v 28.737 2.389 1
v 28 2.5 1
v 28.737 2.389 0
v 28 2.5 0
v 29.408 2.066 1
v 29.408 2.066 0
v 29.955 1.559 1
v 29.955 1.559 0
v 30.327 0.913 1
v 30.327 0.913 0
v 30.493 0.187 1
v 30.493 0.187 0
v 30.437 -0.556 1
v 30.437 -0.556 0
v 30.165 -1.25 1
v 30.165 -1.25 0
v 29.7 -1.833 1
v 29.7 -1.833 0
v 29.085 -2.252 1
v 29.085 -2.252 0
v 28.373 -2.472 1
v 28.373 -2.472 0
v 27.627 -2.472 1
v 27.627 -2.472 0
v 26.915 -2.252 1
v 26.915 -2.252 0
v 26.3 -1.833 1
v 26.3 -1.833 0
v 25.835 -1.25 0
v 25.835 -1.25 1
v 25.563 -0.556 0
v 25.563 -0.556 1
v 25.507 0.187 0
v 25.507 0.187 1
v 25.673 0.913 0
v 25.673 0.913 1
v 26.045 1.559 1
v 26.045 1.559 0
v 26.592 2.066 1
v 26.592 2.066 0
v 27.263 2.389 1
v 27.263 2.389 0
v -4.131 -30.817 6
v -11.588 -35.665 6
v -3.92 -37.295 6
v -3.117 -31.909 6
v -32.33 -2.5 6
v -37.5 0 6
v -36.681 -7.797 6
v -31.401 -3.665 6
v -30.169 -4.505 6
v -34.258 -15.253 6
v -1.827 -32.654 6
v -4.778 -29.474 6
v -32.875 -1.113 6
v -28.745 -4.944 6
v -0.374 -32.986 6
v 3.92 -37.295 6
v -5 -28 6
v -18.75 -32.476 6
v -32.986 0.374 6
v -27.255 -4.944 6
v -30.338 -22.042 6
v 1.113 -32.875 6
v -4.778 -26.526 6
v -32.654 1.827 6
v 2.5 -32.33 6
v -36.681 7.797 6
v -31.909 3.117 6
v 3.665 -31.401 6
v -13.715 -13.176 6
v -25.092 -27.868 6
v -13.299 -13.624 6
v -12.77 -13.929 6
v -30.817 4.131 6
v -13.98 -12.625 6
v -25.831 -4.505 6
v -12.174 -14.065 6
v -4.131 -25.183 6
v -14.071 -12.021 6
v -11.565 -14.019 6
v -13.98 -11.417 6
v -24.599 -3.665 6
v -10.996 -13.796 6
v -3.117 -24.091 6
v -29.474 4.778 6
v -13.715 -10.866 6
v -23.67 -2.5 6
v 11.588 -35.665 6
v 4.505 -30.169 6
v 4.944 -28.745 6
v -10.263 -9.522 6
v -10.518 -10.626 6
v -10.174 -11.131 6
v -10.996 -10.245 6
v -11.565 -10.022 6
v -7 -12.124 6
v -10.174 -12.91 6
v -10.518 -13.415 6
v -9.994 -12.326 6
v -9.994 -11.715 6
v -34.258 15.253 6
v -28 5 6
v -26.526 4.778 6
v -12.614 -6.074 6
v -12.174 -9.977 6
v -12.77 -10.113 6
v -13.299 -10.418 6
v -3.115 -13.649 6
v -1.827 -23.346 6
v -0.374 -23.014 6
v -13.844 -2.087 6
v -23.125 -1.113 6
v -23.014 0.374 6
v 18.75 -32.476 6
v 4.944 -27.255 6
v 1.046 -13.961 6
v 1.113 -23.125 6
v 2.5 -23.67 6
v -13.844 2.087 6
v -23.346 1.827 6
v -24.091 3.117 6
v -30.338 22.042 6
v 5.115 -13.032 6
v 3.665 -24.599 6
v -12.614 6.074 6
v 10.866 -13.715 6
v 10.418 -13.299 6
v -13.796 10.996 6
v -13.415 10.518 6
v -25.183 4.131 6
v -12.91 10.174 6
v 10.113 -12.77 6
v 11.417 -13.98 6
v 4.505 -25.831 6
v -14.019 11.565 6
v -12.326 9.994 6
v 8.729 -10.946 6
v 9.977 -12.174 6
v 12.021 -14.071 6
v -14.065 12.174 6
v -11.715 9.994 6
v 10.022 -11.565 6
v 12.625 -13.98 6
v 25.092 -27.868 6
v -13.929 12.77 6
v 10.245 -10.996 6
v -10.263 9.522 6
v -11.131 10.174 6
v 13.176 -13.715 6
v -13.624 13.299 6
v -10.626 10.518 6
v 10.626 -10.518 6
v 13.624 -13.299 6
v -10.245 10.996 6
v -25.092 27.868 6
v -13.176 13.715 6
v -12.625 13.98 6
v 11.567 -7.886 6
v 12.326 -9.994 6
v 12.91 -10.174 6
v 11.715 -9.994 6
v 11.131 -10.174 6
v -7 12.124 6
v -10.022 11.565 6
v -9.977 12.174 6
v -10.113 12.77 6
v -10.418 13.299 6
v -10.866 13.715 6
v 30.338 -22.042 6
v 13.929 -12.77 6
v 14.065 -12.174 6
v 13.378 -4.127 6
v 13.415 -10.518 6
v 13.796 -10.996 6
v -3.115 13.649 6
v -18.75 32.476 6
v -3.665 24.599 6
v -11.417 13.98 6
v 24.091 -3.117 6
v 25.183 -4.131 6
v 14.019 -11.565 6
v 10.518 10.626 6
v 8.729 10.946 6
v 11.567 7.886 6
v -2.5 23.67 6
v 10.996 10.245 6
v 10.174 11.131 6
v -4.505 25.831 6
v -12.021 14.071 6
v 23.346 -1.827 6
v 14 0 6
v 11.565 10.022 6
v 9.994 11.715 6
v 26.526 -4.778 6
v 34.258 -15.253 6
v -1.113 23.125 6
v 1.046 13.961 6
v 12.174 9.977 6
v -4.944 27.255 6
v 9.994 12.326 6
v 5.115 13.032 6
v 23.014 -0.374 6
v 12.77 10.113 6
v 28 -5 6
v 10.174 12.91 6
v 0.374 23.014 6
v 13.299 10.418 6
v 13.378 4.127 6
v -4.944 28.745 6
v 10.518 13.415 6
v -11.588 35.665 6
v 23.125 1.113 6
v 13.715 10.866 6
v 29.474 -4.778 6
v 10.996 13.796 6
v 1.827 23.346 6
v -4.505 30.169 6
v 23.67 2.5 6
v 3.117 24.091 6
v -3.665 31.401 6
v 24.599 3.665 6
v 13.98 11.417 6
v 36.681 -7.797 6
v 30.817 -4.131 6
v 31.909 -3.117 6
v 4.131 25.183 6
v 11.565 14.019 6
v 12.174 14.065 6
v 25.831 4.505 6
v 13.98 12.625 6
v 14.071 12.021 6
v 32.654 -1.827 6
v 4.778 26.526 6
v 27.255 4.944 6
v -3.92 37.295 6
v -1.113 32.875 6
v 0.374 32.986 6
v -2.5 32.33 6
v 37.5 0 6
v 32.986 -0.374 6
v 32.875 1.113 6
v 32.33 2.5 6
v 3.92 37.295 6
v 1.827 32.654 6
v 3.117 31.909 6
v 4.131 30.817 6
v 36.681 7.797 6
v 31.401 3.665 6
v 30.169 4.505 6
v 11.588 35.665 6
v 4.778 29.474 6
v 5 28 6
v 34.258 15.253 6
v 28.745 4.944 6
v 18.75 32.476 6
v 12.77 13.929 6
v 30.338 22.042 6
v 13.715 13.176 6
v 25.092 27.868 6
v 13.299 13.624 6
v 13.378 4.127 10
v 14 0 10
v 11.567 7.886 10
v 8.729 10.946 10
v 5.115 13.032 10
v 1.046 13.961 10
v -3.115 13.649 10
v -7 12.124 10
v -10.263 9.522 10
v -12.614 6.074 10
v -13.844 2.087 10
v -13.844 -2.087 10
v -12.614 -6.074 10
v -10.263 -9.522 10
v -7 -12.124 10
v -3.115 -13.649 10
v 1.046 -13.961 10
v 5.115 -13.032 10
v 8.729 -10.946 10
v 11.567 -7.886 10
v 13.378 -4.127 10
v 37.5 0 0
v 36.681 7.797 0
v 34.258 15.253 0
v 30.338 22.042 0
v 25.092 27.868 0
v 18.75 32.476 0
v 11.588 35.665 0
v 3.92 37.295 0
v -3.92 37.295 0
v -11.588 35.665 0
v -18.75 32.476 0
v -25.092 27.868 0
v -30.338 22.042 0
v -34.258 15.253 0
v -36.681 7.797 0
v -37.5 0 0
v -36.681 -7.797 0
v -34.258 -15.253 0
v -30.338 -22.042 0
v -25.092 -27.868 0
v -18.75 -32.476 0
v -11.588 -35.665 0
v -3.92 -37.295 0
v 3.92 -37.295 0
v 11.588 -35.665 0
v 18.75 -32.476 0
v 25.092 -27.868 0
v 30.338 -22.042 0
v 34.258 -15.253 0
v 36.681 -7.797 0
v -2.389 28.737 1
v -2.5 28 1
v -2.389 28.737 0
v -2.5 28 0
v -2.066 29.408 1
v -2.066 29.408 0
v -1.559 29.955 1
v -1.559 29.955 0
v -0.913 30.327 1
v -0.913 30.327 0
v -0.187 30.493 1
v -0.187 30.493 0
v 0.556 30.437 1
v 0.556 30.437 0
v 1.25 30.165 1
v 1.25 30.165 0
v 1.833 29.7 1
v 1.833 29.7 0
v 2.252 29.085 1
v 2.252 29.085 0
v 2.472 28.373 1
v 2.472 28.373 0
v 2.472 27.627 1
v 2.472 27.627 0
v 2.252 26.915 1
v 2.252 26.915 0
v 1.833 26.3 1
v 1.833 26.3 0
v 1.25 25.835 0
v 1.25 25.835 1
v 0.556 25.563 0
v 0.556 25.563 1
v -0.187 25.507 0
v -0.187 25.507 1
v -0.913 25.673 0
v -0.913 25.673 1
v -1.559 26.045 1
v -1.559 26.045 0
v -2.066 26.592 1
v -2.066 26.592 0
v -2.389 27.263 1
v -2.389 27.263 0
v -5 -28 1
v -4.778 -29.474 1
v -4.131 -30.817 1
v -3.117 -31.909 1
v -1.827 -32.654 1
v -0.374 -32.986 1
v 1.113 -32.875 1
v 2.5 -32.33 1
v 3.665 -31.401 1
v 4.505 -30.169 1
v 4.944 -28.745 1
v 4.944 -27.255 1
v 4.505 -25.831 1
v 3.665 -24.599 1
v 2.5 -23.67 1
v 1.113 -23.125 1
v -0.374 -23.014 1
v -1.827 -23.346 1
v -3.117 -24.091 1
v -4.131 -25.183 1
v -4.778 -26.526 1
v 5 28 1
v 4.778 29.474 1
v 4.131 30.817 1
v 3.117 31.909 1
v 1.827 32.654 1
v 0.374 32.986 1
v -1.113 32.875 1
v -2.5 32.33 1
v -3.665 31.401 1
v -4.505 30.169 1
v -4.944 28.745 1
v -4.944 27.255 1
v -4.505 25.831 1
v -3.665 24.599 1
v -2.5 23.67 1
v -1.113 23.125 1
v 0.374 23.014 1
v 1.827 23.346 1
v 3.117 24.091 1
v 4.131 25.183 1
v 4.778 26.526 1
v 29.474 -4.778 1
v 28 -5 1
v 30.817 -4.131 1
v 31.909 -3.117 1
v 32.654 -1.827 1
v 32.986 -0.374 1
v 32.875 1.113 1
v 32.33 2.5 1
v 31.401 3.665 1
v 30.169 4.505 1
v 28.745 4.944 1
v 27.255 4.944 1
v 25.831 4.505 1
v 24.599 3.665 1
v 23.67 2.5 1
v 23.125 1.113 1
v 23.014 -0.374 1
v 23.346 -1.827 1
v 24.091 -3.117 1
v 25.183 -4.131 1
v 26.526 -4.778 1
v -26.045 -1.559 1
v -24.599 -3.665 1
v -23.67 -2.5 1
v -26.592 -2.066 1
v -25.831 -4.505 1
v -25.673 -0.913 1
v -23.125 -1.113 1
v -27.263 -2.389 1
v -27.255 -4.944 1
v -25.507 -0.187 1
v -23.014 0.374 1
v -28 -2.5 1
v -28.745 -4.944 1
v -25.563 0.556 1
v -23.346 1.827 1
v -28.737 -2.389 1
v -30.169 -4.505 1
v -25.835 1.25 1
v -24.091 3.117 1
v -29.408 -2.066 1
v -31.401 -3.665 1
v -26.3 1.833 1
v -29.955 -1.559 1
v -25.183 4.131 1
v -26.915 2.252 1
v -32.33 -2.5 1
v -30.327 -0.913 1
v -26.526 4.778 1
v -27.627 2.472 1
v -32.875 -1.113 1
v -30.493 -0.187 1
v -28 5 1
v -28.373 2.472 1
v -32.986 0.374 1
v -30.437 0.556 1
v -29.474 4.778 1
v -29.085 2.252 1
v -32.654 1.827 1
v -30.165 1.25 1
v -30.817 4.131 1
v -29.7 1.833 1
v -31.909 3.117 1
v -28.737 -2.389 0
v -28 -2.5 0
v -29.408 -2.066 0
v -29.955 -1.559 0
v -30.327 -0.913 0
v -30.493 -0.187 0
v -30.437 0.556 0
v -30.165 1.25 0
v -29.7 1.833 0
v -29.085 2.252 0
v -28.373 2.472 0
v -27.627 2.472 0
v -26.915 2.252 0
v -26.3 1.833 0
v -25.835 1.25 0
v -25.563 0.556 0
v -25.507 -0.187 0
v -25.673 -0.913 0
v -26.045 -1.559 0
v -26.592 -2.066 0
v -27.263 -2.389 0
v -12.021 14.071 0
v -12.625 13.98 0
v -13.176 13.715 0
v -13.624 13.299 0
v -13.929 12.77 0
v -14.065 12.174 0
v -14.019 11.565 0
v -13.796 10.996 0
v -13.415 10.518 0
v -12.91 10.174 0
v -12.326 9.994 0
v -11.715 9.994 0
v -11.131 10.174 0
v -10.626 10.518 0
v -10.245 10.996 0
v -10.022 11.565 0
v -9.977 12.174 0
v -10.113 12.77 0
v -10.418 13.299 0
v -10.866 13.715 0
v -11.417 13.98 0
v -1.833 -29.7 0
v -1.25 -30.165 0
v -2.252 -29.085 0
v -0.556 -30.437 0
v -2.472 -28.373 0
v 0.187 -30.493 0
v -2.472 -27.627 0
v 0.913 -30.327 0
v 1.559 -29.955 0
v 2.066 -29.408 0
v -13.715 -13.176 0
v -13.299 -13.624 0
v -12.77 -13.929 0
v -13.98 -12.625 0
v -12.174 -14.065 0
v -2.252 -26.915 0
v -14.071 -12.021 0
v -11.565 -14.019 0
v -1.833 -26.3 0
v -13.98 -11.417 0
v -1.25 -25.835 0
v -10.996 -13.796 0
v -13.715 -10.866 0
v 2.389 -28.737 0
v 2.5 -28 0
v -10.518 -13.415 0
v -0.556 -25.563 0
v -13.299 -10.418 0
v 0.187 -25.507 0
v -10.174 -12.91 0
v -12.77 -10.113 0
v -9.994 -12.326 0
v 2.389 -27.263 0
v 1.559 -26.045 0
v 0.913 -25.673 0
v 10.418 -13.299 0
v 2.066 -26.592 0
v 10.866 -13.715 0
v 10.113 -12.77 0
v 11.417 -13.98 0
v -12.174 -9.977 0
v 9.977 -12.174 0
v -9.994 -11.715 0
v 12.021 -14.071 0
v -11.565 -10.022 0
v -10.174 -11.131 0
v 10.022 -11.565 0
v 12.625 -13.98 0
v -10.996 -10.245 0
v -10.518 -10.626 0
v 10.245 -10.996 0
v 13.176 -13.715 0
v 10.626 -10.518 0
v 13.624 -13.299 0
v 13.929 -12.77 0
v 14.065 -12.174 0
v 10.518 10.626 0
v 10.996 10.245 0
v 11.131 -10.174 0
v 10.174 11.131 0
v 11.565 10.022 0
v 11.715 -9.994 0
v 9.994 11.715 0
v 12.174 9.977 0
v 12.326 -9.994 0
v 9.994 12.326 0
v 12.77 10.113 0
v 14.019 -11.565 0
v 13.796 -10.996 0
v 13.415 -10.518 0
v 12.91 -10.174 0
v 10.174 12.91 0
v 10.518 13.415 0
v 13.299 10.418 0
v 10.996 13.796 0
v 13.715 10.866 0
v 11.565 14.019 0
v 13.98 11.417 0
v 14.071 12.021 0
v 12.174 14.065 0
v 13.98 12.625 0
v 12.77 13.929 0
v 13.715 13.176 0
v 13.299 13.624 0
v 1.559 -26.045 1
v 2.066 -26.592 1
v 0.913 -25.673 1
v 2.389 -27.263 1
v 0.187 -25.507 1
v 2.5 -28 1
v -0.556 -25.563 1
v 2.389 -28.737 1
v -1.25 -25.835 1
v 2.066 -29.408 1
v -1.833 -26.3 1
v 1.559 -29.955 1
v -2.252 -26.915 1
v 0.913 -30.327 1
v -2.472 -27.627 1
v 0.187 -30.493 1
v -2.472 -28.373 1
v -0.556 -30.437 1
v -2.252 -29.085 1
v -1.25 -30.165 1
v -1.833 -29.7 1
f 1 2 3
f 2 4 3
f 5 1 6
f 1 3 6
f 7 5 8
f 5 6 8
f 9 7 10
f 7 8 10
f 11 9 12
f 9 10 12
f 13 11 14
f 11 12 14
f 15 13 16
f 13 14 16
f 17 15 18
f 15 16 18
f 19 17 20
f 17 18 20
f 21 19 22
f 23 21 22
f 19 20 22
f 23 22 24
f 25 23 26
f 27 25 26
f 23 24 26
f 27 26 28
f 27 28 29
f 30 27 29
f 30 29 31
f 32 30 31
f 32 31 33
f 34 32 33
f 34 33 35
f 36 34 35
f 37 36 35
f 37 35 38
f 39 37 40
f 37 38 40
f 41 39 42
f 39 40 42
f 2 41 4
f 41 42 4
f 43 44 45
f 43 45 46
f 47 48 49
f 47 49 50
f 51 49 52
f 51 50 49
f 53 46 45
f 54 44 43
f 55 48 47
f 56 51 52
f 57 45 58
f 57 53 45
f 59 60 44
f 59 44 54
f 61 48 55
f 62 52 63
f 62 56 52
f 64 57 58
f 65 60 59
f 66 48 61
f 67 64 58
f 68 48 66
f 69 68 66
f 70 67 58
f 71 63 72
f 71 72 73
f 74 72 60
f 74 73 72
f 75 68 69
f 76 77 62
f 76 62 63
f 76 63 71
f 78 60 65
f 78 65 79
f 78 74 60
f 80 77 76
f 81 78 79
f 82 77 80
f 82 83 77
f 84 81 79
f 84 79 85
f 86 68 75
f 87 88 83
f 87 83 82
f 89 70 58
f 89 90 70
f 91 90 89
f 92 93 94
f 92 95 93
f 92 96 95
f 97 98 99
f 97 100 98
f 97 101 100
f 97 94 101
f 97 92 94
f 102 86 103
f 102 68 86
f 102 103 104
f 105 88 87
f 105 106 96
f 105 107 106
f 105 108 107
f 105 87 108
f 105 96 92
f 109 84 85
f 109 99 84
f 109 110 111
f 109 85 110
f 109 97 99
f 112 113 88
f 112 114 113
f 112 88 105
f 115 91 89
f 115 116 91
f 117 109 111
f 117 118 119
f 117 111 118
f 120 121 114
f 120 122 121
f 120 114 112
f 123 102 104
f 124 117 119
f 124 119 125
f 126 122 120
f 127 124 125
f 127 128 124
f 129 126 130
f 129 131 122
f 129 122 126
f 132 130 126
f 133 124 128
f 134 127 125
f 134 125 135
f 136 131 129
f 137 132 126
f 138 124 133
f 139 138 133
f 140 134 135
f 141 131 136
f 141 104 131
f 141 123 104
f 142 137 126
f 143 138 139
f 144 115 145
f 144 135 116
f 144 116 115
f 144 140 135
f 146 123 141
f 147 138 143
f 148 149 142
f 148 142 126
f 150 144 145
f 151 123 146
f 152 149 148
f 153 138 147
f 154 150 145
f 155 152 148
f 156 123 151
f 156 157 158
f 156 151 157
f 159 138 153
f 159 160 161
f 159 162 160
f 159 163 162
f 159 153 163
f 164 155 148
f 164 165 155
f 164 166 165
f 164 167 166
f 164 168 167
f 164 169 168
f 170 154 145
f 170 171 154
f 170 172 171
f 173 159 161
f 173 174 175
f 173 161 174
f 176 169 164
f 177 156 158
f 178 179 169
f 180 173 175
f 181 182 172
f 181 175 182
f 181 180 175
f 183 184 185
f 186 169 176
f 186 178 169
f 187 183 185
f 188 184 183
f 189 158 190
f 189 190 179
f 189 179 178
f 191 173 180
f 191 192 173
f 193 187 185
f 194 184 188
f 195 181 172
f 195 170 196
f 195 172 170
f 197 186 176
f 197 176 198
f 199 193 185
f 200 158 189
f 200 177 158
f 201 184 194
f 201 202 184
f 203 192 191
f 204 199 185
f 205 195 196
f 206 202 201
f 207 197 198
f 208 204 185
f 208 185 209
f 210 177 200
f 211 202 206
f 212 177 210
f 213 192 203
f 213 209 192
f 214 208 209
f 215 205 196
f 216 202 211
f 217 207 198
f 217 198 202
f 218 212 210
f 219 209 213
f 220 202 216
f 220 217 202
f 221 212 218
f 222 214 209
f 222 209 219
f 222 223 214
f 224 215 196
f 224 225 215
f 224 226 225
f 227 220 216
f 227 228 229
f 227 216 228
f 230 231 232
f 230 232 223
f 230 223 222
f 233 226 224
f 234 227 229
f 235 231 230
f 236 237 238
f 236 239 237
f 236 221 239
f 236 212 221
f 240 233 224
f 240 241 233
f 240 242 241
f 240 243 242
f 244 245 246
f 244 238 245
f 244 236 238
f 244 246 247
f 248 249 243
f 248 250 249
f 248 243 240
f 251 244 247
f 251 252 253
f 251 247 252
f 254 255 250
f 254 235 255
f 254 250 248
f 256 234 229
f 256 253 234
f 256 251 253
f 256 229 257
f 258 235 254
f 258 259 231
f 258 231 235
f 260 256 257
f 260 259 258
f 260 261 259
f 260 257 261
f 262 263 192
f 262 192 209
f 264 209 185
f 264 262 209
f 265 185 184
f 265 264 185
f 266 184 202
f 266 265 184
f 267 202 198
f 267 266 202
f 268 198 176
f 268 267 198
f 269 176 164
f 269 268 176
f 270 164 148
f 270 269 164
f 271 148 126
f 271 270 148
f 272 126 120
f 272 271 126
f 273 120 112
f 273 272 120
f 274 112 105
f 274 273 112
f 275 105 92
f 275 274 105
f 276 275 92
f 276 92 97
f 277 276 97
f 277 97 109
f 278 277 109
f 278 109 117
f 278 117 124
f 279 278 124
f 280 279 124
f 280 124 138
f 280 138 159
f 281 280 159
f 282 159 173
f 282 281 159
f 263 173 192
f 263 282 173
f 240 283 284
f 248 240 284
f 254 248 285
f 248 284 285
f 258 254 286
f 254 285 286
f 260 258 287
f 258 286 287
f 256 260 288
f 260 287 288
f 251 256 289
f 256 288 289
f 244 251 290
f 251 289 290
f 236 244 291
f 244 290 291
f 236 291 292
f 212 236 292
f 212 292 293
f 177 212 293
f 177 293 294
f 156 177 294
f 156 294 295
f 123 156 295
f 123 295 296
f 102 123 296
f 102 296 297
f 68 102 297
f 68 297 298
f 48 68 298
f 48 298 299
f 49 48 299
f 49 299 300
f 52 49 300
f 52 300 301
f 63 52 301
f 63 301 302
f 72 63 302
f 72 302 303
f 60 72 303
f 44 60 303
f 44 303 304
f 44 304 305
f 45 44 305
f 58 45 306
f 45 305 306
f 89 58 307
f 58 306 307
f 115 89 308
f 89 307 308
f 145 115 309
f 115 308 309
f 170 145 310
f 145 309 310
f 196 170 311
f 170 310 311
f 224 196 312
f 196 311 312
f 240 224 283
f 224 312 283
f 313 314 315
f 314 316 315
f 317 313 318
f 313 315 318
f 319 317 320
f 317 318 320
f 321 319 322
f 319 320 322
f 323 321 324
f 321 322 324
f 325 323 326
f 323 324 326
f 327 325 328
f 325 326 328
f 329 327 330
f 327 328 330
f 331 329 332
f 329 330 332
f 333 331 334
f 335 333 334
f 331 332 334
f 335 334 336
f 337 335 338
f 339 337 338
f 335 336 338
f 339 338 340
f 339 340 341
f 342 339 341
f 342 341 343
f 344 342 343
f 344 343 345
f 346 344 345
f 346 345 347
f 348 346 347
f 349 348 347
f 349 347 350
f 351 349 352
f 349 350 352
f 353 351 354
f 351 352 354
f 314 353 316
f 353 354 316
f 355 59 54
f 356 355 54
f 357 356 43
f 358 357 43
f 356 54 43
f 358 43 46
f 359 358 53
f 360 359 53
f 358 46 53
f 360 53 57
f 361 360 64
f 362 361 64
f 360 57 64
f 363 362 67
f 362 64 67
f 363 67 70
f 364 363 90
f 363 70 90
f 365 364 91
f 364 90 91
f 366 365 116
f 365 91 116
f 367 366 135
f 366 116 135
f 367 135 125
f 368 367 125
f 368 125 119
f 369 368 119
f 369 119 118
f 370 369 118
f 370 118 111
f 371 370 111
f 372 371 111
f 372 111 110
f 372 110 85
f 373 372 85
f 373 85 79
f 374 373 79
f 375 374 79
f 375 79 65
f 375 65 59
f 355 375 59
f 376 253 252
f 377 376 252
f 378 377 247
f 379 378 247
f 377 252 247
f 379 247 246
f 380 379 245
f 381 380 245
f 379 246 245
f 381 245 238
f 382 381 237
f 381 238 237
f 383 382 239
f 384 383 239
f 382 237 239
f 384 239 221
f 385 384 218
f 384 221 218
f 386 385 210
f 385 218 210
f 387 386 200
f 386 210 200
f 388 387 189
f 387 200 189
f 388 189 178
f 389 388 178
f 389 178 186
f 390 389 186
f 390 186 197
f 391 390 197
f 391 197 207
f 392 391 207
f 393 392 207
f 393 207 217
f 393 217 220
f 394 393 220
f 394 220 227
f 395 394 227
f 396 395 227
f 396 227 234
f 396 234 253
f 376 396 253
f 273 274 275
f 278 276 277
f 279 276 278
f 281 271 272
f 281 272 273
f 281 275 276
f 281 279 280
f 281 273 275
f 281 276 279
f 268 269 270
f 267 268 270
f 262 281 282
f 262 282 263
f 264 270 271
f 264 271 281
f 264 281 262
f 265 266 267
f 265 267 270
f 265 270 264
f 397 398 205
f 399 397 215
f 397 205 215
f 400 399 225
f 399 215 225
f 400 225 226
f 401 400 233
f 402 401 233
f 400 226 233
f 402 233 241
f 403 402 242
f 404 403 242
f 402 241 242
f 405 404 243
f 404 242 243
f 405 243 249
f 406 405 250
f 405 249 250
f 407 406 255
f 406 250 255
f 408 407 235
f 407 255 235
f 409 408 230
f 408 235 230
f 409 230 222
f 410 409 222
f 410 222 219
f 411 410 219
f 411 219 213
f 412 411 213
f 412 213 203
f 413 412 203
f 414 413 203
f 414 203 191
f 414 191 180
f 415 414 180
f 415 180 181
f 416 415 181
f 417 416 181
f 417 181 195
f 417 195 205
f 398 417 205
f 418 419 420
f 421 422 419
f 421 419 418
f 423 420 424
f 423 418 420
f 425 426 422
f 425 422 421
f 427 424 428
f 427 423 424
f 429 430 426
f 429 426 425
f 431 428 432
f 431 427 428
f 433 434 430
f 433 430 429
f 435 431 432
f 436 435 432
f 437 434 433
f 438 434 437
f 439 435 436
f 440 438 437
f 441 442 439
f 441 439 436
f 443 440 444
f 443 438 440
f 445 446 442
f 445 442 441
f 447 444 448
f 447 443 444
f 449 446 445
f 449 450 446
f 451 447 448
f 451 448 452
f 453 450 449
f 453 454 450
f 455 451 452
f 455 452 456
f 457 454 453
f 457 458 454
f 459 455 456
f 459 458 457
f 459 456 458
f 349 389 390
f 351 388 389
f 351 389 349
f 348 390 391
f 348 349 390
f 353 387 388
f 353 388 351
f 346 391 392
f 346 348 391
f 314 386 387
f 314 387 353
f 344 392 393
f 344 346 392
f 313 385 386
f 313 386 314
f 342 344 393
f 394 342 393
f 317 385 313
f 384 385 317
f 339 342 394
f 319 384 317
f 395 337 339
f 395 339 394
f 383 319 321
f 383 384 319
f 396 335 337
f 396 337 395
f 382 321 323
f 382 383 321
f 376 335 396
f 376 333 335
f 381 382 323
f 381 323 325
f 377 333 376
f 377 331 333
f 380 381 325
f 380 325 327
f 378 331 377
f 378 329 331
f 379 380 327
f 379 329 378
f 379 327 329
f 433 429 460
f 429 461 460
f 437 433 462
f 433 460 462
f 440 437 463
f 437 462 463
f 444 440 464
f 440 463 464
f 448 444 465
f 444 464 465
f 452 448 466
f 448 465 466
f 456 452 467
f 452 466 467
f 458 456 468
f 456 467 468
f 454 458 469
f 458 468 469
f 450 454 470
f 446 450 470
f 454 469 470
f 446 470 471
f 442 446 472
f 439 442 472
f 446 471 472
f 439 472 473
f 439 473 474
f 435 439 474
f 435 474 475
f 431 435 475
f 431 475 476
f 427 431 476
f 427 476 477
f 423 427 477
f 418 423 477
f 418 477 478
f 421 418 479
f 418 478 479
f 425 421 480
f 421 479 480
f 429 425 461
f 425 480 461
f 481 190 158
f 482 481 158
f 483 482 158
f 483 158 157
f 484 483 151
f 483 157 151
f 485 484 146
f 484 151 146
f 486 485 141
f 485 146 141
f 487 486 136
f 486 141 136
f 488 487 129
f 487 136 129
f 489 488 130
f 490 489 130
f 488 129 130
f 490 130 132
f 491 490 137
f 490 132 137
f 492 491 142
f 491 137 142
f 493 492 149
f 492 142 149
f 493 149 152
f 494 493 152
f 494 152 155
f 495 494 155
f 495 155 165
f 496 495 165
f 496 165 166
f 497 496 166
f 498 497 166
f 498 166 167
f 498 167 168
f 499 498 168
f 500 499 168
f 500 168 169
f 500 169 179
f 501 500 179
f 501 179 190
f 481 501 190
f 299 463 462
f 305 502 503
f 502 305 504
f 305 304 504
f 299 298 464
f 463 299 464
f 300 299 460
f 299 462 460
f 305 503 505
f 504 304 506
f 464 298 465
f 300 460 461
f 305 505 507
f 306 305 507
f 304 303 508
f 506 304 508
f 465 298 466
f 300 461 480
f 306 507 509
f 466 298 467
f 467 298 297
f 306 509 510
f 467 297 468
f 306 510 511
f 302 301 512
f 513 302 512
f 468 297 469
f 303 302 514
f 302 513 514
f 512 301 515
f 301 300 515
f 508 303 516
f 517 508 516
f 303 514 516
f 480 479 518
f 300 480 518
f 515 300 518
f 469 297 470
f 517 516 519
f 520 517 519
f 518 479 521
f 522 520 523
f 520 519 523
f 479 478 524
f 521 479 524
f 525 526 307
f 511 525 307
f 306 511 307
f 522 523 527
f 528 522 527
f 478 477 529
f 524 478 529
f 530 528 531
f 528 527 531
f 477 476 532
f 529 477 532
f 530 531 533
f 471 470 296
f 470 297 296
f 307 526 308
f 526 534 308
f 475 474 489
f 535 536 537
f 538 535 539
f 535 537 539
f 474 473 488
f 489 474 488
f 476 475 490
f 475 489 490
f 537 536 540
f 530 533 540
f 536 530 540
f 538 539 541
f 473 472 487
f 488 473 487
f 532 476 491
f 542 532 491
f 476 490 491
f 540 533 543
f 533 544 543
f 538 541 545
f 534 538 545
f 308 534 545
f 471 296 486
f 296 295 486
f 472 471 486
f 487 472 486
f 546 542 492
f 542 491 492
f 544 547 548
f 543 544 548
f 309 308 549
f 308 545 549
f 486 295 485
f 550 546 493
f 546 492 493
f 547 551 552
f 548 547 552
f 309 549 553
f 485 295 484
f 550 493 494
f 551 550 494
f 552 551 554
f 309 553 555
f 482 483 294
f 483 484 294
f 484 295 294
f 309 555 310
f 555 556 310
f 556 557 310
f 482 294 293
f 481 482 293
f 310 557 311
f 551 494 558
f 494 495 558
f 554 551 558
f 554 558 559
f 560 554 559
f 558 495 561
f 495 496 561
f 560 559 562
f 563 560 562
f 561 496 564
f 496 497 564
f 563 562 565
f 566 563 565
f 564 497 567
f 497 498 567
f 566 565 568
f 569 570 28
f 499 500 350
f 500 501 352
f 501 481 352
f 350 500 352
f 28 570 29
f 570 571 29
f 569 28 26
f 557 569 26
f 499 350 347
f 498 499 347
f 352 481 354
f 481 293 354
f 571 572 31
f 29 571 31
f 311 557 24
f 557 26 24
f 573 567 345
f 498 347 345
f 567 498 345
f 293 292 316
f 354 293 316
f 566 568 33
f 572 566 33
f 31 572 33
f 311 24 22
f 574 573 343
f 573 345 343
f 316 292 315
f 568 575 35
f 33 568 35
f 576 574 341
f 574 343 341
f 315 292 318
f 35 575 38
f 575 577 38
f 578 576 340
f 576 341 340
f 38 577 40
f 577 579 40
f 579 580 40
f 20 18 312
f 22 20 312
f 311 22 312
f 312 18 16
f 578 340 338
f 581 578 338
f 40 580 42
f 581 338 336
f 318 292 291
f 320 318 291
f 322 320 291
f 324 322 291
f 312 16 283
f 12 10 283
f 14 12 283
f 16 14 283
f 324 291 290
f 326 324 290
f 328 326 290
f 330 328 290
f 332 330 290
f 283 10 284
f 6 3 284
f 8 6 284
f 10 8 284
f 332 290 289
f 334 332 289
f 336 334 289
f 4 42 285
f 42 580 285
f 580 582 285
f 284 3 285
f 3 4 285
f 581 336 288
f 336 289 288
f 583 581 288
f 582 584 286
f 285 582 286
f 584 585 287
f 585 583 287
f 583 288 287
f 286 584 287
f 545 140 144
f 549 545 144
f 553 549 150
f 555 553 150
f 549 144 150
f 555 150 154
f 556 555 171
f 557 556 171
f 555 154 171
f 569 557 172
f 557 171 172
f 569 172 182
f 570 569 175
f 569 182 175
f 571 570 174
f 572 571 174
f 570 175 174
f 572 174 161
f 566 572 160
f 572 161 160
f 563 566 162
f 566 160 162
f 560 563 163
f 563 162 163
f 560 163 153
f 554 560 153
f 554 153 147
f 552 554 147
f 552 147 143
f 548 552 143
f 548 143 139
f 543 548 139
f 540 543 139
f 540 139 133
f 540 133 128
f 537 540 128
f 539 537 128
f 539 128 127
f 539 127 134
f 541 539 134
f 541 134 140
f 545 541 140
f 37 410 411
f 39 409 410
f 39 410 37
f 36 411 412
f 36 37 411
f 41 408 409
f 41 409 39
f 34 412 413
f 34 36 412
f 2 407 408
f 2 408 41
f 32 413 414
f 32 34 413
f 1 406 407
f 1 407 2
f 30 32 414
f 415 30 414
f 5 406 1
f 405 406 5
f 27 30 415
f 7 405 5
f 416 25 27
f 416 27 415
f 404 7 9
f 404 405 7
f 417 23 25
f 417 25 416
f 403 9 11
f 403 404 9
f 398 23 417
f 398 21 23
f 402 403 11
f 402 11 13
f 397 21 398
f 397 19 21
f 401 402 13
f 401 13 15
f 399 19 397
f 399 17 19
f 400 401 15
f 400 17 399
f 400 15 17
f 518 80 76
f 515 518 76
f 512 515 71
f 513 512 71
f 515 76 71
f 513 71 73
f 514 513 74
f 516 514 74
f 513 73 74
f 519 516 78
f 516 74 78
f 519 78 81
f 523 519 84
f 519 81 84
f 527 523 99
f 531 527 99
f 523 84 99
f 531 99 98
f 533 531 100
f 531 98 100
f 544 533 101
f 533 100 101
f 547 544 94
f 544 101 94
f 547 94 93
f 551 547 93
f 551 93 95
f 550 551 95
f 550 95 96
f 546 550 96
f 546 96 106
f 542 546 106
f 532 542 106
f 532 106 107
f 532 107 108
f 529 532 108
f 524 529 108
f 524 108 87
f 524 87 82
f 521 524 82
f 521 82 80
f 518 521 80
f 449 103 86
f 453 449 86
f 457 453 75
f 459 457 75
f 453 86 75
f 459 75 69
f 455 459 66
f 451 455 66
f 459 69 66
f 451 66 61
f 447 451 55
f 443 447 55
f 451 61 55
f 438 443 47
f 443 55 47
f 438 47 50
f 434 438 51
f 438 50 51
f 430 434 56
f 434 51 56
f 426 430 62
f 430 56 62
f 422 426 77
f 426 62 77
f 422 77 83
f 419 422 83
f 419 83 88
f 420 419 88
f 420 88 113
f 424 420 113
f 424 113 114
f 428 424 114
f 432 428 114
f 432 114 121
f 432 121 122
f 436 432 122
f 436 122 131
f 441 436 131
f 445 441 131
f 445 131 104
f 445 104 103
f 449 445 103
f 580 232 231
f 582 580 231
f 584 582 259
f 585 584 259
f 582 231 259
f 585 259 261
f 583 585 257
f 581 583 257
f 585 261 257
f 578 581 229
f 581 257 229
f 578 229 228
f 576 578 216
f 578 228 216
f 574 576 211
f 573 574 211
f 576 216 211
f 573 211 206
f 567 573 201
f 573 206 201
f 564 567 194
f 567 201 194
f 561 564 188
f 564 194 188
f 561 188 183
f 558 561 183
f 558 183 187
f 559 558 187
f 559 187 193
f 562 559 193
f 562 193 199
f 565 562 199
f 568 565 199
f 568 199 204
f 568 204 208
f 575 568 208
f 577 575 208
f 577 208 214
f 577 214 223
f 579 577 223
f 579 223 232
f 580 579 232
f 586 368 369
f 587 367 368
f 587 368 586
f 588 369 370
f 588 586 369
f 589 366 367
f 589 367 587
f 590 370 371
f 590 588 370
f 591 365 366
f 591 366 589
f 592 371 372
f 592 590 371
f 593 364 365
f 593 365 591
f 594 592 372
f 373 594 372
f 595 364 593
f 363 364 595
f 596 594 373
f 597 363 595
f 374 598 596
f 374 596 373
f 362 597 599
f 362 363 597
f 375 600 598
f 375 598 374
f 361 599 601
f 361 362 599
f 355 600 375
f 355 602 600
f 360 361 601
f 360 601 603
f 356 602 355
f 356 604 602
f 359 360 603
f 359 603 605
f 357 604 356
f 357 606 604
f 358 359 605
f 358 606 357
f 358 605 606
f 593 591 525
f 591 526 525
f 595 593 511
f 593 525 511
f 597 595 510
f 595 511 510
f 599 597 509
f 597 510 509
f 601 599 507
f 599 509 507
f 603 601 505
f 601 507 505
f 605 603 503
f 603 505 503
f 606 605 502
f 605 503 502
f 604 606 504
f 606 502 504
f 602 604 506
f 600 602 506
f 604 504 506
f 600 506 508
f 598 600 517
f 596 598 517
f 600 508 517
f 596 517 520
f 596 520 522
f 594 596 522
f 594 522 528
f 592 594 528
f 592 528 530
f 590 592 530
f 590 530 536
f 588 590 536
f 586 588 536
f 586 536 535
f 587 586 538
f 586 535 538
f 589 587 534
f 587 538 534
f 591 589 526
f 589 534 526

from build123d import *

# Parameters (mm, degrees)
F0_R            = 37.5
F1_DEPTH        = 10
F2_R            = 37.5
F2_R_2          = 14
F3_DEPTH        = 4
F5_D            = 5
F5_CBORE_D      = 10
F5_CBORE_DEPTH  = 5
F5_COPIES_COUNT = 4
F7_D            = 4.1
F7_COPIES_COUNT = 4


# Not quite as in the source:
# - a pattern or mirror of a feature is missing from the dataset's text; its kind, count and spacing are read off the source's solid
# - a feature names something its author has since deleted; it is built from what else it names


with BuildPart() as f1:
    # F0 (on Top) → F1 (new body)
    with BuildSketch(Plane.XY):
        Circle(F0_R)
    extrude(amount=F1_DEPTH)

    # F2 (on face) → F3 (cut)
    with BuildSketch(Plane.XY.offset(10)):
        Circle(F2_R)
        Circle(F2_R_2, mode=Mode.SUBTRACT)
    extrude(amount=-F3_DEPTH, mode=Mode.SUBTRACT)

    # F5 (through all)
    with Locations(Plane.XY.offset(6)):
        with Locations((0, 28)):
            f5 = CounterBoreHole(F5_D / 2, F5_CBORE_D / 2, F5_CBORE_DEPTH)

    # F5_copies: F5 ×4 about axis
    f5_copies_axis = Axis((0, 0, 0), (0, 0, 1))
    for i in range(1, F5_COPIES_COUNT):
        add(f5.rotate(f5_copies_axis, i * 360 / F5_COPIES_COUNT), mode=Mode.SUBTRACT)

    # F7 (through all)
    with Locations(Plane(origin=(0, 0, 0), x_dir=(1, 0, 0), z_dir=(0, 0, -1))):
        with Locations((-12.0208152802, 12.0208152802)):
            f7 = Hole(F7_D / 2)

    # F7_copies: F7 ×4 about axis
    f7_copies_axis = Axis((0, 0, 0), (0, 0, 1))
    for i in range(1, F7_COPIES_COUNT):
        add(f7.rotate(f7_copies_axis, i * 360 / F7_COPIES_COUNT), mode=Mode.SUBTRACT)


solid = f1.part
